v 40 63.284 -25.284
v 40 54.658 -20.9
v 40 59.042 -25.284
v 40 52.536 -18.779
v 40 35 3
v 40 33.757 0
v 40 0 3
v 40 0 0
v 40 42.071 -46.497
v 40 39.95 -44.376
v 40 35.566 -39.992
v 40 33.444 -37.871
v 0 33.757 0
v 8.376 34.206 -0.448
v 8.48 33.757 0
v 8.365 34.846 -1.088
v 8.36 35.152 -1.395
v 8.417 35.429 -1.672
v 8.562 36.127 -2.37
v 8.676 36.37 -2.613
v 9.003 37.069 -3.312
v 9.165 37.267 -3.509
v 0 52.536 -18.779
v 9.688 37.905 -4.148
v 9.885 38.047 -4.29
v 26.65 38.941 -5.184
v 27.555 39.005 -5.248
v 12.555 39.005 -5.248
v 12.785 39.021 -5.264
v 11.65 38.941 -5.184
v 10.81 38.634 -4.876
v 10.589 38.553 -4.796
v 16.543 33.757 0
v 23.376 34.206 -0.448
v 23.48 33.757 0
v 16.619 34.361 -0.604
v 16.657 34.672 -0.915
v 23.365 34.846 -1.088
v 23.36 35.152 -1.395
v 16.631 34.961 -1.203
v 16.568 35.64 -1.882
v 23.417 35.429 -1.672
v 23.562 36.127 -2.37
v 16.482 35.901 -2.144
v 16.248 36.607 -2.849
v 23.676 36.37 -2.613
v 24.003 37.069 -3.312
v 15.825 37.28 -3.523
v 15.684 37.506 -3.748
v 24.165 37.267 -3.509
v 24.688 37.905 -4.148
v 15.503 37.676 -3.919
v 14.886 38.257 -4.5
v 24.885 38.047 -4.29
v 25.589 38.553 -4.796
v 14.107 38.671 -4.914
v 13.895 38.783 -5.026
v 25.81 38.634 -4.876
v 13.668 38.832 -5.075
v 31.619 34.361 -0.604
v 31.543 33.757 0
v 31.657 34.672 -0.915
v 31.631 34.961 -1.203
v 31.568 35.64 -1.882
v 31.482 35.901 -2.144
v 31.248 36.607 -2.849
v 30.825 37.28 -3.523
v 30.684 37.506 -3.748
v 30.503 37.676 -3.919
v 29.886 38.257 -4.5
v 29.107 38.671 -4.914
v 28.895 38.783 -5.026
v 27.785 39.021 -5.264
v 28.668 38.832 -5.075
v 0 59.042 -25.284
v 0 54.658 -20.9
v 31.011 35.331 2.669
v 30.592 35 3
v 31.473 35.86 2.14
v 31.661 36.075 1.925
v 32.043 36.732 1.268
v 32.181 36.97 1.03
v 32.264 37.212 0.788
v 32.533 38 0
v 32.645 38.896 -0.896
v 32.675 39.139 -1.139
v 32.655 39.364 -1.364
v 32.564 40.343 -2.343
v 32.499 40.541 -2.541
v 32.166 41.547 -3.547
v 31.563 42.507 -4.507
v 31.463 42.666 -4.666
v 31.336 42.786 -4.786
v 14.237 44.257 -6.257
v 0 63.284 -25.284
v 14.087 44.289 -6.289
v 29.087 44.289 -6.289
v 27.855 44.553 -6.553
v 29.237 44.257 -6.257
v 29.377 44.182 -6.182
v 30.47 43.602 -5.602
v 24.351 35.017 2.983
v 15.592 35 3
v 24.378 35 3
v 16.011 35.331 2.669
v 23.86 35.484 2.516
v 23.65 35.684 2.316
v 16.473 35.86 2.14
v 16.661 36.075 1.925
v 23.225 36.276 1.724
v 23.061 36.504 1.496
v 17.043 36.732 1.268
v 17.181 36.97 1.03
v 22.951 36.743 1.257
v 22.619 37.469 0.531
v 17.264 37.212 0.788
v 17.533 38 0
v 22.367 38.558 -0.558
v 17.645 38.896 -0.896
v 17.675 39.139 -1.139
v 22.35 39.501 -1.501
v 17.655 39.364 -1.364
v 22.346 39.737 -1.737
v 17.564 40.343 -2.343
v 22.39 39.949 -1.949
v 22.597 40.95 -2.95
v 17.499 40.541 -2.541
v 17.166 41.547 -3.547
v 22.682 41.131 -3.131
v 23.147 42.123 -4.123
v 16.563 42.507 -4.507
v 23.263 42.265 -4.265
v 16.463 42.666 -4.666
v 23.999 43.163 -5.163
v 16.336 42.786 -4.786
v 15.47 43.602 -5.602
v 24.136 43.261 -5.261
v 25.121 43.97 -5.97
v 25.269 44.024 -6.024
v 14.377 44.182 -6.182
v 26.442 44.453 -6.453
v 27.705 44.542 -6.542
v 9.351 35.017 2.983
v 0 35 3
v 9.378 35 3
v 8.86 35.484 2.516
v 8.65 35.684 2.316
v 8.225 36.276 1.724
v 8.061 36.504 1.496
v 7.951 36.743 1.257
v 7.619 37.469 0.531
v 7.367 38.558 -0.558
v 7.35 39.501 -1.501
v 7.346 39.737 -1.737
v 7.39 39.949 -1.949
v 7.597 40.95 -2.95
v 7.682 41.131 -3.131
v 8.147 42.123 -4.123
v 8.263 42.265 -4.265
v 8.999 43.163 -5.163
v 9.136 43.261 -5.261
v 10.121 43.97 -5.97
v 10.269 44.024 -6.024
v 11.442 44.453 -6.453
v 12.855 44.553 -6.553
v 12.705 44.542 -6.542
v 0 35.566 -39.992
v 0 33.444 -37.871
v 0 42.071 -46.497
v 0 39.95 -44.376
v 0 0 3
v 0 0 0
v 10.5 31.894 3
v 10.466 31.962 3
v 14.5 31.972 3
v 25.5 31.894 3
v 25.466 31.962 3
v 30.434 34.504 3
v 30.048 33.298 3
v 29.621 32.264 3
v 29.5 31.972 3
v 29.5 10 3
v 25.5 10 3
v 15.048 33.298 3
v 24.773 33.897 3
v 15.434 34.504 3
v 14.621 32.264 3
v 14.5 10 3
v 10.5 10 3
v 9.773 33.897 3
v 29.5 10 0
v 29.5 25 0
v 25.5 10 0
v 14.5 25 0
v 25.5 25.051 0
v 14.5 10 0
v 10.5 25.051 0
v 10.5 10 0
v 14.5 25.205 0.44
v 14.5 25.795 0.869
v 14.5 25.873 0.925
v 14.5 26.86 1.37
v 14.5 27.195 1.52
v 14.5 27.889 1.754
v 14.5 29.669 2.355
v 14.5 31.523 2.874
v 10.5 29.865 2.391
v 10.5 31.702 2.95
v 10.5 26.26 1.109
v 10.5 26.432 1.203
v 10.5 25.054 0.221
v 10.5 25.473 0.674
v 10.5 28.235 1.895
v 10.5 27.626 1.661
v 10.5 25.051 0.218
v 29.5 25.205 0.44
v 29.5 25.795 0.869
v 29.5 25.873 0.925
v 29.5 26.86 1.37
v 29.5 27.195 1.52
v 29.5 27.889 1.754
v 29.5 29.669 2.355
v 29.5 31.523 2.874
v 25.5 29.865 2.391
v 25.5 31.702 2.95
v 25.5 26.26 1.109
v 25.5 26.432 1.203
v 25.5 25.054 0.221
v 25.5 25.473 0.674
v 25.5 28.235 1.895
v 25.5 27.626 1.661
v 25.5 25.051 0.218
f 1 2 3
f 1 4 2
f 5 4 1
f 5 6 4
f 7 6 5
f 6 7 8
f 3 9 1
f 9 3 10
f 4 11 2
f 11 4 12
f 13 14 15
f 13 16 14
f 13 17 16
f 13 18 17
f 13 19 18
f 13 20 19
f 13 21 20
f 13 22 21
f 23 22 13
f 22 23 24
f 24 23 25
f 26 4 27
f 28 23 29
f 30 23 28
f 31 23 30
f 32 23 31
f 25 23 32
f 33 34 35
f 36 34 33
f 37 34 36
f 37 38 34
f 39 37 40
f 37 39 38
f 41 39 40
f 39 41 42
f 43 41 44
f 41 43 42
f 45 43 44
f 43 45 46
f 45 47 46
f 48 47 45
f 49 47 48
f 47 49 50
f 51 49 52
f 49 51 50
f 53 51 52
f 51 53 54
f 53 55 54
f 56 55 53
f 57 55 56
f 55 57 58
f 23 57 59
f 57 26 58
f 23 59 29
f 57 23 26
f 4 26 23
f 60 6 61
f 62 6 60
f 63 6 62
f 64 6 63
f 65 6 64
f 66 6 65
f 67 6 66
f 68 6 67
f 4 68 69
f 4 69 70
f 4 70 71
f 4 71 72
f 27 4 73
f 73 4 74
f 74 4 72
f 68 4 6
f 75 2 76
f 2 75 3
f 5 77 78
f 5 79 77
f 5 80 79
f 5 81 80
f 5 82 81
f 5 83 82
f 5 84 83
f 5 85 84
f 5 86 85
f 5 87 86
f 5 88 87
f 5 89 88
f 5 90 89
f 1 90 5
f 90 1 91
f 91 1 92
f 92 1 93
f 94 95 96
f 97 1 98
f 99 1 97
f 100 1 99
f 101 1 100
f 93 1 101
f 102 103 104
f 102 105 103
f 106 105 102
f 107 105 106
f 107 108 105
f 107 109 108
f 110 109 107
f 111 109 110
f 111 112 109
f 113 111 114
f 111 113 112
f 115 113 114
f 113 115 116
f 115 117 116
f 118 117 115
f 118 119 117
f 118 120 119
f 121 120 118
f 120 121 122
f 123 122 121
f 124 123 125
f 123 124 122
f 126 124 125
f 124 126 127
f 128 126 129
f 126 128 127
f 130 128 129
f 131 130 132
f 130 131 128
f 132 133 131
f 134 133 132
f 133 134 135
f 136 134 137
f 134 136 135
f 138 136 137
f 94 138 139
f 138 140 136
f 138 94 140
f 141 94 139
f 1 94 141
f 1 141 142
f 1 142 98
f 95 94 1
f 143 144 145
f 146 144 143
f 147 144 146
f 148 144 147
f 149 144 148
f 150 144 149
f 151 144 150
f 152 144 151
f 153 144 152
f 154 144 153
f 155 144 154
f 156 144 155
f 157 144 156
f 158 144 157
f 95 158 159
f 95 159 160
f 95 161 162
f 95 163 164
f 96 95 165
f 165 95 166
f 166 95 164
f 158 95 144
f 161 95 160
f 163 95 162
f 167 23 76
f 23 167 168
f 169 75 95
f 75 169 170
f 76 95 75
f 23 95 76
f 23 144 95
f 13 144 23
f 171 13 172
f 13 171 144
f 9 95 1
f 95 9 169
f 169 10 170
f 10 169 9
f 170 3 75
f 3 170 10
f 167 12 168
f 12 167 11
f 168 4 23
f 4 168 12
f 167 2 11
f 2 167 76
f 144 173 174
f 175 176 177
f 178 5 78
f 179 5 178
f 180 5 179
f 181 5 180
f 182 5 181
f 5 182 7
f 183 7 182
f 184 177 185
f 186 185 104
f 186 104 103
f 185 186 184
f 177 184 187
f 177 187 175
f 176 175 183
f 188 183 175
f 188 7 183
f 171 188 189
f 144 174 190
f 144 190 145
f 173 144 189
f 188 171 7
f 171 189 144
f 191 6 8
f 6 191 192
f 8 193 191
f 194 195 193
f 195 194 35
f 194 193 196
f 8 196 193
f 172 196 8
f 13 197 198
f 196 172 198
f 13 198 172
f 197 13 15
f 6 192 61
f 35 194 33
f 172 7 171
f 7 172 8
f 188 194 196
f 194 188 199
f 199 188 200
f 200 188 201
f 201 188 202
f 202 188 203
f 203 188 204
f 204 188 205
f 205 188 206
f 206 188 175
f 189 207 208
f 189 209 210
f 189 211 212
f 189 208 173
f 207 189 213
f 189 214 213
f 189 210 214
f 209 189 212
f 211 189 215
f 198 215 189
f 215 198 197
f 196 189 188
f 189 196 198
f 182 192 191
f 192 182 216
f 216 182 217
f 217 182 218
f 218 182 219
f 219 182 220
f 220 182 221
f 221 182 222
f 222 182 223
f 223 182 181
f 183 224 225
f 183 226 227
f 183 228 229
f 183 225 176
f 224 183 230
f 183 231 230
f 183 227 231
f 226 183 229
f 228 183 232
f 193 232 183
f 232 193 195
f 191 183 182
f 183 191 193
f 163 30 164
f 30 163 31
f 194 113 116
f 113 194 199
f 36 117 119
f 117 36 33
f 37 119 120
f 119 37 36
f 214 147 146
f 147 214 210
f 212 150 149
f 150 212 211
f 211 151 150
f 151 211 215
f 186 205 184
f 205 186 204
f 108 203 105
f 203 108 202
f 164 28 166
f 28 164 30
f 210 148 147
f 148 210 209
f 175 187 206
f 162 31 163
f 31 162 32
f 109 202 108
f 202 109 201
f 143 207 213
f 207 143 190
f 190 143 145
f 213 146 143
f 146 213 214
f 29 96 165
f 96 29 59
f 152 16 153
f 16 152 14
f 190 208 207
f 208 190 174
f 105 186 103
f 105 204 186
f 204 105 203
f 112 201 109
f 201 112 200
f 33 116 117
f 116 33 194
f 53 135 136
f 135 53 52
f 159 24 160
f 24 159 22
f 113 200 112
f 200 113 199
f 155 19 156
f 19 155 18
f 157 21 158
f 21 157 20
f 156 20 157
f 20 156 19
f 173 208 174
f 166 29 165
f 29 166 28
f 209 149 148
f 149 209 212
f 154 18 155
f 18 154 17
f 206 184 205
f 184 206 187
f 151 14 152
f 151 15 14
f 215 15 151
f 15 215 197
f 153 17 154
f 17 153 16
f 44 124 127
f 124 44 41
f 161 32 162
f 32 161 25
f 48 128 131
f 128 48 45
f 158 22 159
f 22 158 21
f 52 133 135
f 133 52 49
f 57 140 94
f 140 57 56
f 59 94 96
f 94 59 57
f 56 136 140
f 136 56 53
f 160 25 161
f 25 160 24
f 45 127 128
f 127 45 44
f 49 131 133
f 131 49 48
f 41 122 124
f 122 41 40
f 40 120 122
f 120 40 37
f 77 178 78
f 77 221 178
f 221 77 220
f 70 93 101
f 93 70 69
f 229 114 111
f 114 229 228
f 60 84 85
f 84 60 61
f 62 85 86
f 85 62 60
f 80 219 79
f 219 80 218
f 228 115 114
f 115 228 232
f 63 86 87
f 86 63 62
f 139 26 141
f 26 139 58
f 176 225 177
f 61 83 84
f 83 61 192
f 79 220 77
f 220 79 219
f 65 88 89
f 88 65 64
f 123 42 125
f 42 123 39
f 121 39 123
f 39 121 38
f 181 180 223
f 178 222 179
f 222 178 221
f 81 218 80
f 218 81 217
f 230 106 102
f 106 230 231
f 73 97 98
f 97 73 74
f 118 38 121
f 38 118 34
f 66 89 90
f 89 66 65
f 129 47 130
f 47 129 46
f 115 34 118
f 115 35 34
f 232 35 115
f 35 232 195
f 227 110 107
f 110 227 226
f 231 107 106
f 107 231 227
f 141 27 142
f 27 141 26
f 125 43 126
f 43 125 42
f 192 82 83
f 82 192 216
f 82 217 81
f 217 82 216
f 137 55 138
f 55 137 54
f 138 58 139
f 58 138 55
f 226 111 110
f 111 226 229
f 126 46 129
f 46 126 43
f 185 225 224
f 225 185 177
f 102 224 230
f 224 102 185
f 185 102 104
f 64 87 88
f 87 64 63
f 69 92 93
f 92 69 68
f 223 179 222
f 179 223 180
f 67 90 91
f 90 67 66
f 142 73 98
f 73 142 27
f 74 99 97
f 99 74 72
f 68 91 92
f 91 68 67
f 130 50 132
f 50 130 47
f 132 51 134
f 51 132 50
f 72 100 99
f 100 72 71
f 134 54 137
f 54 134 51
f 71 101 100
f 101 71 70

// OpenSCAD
w = 3;
d = 4;

dw = 40;

hh = 30;

difference(){
union(){    
cube([dw,35,w]);//Front panel

translate([0,35,3])
rotate([135,0,0])
translate([0,-40,0])
{
cube([dw,40,w]);//top
    
cube([dw,w,hh]);
translate([0,w+6.2,0])
cube([dw,w,hh]);
}    
}

translate([dw/2-7.5-d/2,10,-.1])
cube([d,40,w+1]);
    
translate([dw/2+7.5-d/2,10,-.1])
cube([d,40,w+1]);    

translate([dw/2-7.5,25,0])
rotate([-90,0,0])
cylinder(30,2,9);

translate([dw/2+7.5,25,0])
rotate([-90,0,0])
cylinder(30,2,9);
}
